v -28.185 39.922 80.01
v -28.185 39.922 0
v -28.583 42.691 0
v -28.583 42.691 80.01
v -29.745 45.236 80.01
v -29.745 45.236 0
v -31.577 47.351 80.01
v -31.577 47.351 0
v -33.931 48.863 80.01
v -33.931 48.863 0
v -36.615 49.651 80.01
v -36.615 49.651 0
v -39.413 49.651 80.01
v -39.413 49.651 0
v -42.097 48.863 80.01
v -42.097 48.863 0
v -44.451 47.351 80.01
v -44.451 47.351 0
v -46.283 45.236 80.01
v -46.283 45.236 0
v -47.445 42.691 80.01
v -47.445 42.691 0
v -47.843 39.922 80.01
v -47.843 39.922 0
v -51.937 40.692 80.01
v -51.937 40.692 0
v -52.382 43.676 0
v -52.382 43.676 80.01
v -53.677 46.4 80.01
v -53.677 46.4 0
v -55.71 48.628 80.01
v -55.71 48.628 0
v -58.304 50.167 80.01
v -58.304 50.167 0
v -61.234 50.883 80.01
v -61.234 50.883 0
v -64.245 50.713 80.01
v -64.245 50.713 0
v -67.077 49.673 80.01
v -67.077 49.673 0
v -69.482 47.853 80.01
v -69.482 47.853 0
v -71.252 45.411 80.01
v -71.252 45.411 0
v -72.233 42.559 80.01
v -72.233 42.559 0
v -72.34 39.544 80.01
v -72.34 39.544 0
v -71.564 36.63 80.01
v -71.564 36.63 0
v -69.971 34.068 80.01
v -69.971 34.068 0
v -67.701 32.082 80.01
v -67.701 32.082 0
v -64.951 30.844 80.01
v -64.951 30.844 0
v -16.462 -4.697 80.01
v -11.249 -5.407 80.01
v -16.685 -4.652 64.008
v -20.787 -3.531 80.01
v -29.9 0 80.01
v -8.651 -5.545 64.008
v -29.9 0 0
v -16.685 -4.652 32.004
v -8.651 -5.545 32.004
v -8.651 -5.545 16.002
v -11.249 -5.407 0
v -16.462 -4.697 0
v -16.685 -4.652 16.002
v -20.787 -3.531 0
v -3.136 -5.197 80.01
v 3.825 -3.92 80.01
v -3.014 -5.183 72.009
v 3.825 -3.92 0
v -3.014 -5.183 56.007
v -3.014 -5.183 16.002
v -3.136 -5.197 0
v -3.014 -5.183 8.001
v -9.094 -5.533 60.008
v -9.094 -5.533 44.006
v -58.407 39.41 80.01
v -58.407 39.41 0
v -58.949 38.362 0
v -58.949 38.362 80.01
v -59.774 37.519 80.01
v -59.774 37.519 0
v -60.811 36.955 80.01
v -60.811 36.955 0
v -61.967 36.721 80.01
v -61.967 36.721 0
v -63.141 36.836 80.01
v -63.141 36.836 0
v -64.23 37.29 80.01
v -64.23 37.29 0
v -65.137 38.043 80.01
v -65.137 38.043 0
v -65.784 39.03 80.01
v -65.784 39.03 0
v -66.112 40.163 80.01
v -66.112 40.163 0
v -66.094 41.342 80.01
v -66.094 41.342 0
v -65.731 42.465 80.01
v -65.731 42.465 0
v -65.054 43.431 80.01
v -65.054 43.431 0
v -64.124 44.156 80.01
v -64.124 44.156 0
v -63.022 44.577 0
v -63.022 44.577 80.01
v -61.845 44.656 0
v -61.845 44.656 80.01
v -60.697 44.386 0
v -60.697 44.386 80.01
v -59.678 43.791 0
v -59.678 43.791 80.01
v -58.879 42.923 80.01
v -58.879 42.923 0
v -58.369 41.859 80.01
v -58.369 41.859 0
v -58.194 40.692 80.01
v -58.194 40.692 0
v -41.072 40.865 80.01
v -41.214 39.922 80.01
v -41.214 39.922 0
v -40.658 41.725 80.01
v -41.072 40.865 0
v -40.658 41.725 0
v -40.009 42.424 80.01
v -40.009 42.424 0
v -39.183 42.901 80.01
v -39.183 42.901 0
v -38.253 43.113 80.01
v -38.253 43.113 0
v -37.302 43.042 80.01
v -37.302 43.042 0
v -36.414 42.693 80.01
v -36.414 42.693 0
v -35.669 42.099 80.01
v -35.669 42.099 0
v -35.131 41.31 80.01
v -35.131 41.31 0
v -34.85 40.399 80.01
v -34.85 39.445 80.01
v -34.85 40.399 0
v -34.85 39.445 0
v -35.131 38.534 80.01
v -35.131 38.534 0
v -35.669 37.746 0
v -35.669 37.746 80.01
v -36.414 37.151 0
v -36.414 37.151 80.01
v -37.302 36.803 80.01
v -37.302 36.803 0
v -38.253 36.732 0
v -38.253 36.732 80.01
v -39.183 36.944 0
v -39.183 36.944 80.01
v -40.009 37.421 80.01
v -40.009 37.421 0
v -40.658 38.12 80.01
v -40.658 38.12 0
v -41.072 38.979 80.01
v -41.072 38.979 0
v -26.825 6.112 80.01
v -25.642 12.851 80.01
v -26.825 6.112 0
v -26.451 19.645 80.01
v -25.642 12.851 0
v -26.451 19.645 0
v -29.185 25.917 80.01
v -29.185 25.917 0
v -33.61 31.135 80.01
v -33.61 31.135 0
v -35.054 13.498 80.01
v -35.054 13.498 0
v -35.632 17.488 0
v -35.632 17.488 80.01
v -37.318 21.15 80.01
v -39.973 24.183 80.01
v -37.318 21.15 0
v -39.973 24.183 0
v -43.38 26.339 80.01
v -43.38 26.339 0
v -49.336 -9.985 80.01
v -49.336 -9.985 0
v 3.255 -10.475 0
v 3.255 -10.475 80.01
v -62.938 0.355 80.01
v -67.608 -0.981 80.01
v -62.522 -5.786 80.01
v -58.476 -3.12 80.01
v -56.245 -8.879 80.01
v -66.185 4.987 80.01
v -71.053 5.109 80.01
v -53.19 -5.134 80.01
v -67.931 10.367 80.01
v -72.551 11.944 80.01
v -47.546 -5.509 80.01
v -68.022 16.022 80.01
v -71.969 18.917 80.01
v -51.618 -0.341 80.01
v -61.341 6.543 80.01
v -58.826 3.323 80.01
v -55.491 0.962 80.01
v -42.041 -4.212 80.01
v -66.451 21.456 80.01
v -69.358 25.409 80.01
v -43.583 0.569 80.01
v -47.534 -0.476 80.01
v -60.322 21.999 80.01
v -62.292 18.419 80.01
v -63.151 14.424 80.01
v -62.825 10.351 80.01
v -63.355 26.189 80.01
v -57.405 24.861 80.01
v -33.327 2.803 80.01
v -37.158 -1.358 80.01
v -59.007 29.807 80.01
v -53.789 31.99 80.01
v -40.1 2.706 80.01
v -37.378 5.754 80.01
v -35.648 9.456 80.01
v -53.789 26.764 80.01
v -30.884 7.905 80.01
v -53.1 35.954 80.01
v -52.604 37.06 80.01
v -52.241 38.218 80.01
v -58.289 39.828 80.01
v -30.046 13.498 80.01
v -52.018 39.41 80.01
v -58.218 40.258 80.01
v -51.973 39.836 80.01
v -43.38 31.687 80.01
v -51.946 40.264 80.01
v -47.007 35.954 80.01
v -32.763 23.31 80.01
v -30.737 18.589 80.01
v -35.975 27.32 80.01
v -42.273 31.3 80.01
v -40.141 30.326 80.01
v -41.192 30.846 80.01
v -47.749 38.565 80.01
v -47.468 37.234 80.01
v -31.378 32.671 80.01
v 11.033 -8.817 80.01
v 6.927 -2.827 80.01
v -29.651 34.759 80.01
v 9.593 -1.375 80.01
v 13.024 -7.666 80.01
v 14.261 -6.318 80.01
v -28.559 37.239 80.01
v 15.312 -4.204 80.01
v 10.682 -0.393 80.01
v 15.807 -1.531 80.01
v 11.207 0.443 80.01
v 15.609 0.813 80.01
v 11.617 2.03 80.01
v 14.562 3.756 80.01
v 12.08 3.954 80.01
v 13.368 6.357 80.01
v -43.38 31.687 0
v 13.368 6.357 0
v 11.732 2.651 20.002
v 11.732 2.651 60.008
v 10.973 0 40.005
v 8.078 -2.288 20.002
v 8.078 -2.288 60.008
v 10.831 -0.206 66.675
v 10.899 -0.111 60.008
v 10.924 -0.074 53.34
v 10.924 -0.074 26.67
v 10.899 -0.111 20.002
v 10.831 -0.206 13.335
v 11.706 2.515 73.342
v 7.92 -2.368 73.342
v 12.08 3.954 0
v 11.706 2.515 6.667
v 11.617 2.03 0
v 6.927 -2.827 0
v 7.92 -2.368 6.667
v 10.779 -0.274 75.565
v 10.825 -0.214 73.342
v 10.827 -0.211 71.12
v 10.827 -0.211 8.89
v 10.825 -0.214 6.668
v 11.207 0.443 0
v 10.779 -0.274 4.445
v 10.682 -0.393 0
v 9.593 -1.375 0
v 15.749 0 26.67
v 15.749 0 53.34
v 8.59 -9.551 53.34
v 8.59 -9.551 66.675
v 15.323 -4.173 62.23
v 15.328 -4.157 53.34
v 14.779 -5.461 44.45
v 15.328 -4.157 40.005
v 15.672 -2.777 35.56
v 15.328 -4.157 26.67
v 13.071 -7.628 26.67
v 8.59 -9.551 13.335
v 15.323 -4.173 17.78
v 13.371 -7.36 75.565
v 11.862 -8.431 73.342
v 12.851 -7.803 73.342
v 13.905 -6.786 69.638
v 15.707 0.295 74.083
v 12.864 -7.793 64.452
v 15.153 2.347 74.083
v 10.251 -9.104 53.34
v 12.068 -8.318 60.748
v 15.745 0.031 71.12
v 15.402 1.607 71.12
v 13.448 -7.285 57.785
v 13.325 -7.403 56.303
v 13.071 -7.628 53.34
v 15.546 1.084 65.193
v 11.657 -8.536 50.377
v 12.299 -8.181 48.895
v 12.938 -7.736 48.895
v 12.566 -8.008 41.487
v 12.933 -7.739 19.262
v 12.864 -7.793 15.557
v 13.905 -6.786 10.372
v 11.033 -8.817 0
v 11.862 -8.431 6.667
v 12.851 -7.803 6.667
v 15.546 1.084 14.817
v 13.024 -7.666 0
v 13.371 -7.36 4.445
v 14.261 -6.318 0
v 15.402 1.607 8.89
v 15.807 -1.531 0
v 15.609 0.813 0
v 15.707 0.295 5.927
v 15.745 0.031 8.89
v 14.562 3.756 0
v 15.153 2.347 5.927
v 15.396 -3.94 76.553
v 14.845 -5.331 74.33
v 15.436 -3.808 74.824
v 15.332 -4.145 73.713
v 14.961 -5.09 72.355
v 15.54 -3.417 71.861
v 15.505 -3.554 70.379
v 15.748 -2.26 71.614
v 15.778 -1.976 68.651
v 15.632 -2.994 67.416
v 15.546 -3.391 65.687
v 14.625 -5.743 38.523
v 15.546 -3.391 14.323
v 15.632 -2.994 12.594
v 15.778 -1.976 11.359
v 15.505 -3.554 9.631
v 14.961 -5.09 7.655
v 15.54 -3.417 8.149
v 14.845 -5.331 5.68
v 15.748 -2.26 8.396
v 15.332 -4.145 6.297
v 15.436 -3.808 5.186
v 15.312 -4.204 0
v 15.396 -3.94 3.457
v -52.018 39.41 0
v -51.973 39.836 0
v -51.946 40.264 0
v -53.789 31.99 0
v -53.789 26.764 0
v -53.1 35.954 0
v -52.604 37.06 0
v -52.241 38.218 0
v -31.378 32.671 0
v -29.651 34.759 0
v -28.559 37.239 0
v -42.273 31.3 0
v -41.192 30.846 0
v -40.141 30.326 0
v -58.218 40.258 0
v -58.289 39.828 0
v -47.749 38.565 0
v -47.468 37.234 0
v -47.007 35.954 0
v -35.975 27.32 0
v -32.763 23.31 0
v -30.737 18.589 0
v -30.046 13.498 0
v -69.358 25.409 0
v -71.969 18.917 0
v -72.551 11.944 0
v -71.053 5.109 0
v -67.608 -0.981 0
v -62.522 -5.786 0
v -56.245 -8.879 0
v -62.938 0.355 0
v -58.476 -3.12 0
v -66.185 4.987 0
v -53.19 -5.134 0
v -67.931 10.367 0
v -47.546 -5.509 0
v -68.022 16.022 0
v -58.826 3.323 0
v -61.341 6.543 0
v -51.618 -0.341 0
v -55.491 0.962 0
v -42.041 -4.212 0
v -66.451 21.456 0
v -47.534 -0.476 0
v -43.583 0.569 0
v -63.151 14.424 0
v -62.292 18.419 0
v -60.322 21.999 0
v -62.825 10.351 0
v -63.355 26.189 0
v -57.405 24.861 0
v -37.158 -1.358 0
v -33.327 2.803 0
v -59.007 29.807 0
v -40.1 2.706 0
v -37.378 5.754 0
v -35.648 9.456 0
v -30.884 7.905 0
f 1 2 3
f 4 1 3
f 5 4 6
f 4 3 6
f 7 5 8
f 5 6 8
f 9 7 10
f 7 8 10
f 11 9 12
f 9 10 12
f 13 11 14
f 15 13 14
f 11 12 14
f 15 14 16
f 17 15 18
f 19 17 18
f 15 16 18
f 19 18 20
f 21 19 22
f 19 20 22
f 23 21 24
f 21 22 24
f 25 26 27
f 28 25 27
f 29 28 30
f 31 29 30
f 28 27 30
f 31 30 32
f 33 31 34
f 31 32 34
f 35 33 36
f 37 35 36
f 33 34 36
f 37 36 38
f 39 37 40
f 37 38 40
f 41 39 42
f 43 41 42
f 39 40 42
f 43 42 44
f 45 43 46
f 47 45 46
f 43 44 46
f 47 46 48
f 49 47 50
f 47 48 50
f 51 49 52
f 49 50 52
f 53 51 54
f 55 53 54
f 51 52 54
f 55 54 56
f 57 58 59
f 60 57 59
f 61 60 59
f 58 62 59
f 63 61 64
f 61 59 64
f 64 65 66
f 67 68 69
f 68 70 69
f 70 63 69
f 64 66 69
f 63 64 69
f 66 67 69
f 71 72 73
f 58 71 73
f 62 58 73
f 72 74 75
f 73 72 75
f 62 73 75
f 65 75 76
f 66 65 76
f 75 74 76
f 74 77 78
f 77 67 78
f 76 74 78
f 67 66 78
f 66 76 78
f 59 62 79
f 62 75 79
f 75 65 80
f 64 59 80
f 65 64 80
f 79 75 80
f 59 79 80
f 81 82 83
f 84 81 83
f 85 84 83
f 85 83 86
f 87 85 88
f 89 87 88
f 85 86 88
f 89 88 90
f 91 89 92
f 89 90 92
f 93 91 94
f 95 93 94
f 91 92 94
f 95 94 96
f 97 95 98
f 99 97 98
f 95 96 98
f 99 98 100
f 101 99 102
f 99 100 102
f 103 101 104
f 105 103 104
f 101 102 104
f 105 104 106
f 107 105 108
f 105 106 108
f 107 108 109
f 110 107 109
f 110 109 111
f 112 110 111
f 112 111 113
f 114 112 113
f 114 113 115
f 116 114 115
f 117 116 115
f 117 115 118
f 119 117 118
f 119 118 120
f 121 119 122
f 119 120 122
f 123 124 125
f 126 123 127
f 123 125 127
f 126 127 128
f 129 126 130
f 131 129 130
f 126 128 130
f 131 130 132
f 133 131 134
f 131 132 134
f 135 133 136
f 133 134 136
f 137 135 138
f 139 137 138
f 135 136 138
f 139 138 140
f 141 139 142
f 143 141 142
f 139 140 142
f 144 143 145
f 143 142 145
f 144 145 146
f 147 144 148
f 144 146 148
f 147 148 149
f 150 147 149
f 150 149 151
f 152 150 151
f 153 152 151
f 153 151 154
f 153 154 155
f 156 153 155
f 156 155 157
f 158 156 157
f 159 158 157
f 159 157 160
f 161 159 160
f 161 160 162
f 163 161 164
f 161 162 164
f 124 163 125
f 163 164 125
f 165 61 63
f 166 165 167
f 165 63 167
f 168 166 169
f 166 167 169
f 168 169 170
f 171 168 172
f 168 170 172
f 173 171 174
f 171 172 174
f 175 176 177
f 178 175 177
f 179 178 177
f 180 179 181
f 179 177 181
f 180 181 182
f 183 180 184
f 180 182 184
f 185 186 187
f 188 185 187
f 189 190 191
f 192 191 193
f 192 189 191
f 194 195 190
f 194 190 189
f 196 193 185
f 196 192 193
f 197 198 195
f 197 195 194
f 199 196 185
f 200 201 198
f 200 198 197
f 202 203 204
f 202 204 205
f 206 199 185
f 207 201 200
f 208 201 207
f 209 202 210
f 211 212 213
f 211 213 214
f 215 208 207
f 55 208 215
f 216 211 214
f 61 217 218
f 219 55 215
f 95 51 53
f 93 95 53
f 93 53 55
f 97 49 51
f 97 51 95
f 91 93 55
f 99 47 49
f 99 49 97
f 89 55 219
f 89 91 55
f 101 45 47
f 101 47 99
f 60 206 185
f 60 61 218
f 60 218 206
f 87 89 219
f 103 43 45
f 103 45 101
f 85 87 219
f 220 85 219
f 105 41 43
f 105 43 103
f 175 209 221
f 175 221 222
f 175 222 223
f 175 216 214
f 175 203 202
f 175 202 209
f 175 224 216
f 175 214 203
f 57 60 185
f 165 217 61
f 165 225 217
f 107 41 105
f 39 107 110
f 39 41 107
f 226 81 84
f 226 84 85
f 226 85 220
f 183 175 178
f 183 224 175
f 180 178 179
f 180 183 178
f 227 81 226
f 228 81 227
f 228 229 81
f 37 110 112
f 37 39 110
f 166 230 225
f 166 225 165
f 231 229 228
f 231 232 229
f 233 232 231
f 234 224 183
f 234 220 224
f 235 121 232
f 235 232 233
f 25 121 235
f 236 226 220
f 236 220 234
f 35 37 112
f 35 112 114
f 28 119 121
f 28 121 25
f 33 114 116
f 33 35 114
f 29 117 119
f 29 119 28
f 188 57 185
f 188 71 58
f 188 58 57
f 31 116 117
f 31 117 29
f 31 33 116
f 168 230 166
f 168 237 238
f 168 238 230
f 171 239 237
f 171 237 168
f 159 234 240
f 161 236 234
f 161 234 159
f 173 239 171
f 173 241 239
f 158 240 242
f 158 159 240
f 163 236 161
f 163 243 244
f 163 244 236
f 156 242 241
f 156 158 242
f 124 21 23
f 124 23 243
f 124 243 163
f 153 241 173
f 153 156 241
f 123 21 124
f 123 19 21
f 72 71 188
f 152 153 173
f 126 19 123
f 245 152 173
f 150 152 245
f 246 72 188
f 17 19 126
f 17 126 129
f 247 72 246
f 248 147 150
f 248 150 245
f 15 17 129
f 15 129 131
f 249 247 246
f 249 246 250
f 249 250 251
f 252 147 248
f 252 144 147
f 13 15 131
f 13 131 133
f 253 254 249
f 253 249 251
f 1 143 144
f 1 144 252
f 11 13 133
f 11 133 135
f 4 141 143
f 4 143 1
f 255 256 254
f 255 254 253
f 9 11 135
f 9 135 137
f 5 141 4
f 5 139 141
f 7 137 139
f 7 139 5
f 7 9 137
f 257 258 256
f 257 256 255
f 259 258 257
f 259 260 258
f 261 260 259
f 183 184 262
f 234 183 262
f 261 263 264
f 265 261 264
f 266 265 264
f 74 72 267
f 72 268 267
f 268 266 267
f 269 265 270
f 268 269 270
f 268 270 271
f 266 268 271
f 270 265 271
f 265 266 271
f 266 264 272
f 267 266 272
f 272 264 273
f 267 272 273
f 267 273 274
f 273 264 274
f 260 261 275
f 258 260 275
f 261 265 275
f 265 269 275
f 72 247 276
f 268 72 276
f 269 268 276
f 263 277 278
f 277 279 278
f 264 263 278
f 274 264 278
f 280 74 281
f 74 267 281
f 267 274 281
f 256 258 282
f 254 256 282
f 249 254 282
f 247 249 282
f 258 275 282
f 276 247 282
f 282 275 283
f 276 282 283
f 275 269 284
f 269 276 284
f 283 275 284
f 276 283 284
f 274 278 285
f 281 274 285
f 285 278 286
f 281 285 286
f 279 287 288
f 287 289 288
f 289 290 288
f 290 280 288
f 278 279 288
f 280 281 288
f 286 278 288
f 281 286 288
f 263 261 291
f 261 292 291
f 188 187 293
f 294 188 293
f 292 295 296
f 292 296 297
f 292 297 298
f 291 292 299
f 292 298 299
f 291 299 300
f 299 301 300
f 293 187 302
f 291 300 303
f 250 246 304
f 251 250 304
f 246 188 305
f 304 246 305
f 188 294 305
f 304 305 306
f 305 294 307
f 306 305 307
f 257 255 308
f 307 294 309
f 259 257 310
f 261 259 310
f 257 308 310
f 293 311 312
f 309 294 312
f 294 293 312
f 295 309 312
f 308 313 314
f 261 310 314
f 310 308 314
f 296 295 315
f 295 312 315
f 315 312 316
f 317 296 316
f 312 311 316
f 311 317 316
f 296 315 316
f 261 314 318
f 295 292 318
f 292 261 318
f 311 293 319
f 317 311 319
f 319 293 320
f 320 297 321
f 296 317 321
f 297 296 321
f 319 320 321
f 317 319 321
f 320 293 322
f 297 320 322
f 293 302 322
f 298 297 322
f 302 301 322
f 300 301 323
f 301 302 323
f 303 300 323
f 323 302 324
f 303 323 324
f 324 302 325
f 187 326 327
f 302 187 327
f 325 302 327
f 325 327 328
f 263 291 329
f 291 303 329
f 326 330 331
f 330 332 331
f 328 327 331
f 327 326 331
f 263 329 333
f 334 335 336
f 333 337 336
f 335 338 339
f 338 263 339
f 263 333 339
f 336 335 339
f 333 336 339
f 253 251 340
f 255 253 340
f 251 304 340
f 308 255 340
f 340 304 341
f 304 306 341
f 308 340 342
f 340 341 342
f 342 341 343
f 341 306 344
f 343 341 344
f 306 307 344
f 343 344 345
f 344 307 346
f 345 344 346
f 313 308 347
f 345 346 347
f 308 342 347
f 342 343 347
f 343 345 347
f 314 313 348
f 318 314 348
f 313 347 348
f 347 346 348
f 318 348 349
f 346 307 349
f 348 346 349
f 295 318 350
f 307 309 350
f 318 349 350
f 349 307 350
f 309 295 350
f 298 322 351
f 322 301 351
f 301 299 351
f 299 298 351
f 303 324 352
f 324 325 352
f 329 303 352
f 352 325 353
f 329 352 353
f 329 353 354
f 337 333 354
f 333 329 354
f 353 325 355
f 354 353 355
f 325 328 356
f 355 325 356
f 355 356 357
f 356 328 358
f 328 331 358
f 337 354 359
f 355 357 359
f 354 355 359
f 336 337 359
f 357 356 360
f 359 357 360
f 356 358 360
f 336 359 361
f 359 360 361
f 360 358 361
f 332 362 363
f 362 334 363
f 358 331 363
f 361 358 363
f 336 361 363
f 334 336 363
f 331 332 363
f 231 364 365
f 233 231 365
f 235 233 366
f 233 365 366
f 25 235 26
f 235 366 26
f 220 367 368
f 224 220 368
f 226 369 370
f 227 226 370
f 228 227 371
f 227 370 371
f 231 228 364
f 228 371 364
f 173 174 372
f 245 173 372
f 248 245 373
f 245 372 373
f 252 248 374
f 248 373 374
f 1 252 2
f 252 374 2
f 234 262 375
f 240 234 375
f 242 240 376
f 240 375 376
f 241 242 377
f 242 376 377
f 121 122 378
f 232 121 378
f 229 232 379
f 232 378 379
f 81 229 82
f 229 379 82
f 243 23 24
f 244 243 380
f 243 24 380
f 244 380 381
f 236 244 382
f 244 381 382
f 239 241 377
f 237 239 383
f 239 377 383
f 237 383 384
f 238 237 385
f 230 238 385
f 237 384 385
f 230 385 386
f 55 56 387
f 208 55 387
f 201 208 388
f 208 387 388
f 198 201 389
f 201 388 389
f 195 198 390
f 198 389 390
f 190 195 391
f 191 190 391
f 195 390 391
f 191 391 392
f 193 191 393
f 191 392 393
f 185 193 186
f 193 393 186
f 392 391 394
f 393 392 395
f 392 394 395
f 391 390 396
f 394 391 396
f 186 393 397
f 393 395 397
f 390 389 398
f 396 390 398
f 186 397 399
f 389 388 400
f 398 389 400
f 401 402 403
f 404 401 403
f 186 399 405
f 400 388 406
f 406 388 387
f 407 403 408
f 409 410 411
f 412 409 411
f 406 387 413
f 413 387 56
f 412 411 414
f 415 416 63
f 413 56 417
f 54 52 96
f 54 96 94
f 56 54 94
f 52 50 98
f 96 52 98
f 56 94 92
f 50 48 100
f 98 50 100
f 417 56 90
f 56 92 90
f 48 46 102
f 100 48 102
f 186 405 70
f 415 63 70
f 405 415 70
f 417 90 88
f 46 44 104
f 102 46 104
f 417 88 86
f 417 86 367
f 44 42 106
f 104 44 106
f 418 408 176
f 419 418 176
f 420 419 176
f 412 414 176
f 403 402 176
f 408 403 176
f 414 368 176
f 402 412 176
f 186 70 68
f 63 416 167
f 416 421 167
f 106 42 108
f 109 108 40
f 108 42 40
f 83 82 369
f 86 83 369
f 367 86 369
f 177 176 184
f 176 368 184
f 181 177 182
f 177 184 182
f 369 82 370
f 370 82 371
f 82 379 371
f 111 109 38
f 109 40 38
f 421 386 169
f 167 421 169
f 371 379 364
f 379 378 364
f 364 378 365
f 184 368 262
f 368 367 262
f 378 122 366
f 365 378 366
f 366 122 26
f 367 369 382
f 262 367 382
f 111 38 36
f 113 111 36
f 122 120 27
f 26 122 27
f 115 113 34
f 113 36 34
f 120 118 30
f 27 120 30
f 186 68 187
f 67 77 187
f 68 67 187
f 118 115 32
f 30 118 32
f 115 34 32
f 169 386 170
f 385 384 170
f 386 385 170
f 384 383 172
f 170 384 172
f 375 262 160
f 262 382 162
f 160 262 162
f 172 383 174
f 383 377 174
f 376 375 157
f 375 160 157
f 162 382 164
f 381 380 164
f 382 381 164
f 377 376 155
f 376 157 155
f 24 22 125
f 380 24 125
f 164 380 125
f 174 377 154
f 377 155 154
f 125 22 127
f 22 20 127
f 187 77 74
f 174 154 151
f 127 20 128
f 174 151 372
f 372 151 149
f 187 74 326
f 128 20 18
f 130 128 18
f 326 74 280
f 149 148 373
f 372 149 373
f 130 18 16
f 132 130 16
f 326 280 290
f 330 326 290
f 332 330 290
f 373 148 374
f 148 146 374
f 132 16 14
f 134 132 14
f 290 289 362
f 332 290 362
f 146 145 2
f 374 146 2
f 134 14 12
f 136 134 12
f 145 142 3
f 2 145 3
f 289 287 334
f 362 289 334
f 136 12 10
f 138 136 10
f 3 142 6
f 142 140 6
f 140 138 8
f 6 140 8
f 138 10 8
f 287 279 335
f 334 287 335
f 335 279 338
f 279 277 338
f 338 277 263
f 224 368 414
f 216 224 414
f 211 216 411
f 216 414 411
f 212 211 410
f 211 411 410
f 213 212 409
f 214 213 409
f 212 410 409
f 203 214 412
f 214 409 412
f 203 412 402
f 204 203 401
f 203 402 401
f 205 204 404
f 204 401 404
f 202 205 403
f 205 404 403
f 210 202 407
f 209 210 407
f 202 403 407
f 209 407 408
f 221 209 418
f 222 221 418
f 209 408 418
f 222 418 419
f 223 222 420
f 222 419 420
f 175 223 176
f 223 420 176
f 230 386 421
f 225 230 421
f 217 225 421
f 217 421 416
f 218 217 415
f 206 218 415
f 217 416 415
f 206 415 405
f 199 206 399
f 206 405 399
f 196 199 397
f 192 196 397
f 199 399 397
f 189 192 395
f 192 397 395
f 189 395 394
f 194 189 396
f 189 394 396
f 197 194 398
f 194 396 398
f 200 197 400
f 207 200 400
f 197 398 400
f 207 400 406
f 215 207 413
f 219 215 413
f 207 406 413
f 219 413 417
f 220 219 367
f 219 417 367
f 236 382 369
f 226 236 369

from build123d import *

# Parameters (mm, degrees)
F1_DEPTH = 80.01


with BuildPart() as f1:
    # F0 (on Top) → F1 (new body)
    with BuildSketch(Plane.XY):
        with BuildLine():
            ThreePointArc((-52.0181724305, 39.4095291981), (-51.9576561565, 40.0496439589), (-51.9374574868, 40.6922956066))
            ThreePointArc((-51.9374574868, 40.6922956066), (-68.346740432, 48.8523585987), (-64.9508257487, 30.8435008261))
            ThreePointArc((-64.9508257487, 30.8435008261), (-58.1184104532, 31.2953658368), (-53.1003625737, 35.9542580053))
            ThreePointArc((-53.1003625737, 35.9542580053), (-52.4052375143, 37.6336514449), (-52.0181724305, 39.4095291981))
        make_face()
        with BuildLine():
            ThreePointArc((-58.1941987012, 40.6922956066), (-58.2476999322, 40.0421660606), (-58.4067640965, 39.4095291981))
            ThreePointArc((-58.4067640965, 39.4095291981), (-66.0943613472, 41.3424251525), (-58.1941987012, 40.6922956066))
        make_face(mode=Mode.SUBTRACT)
        with BuildLine():
            ThreePointArc((-53.1003625737, 35.9542580053), (-58.1184104532, 31.2953658368), (-64.9508257487, 30.8435008261))
            ThreePointArc((-64.9508257487, 30.8435008261), (-71.0530970633, 5.1094793368), (-49.3361916364, -9.9853408308))
            ThreePointArc((-49.3361916364, -9.9853408308), (-38.3858948602, -7.3909049304), (-29.8997519532, 0))
            ThreePointArc((-29.8997519532, 0), (-25.7978316087, 16.2774443926), (-33.6100307457, 31.1351188778))
            ThreePointArc((-33.6100307457, 31.1351188778), (-36.8058711165, 30.1677726155), (-40.1411486067, 30.3261346384))
            ThreePointArc((-40.1411486067, 30.3261346384), (-32.7630206932, 23.3103643966), (-30.0455065973, 13.4984878823))
            ThreePointArc((-30.0455065973, 13.4984878823), (-60.8364931775, -1.5486798035), (-53.788710164, 31.9898184416))
            ThreePointArc((-53.788710164, 31.9898184416), (-48.5632811871, 32.5626024415), (-43.3799688199, 31.6871240532))
            ThreePointArc((-43.3799688199, 31.6871240532), (-45.5036090688, 33.5569434788), (-47.0065913216, 35.9542580053))
            Line((-47.0065913216, 35.9542580053), (-53.1003625737, 35.9542580053))
        make_face()
        with BuildLine():
            ThreePointArc((-29.8997519532, 0), (-38.3858948602, -7.3909049304), (-49.3361916364, -9.9853408308))
            Line((-49.3361916364, -9.9853408308), (3.2553945492, -10.4746920389))
            add(Edge.make_bspline(
                [(3.2553945492, -10.4746920389), (6.7725717344, -9.8207747634), (14.1786098266, -9.4323508669), (16.9026280052, 0.2286933526), (14.1061528831, 4.5015575397), (13.3681874722, 6.3572456129)],
                knots=[0, 0, 0, 0, 0.2950154938, 0.5574011727, 0.7978396153, 0.7978396153, 0.7978396153, 0.7978396153], degree=3))
            add(Edge.make_bspline(
                [(13.3681874722, 6.3572456129), (11.2107009371, 3.3907004664), (12.783682015, -0.4484184196), (6.7198718752, -3.0864083593), (3.824606613, -3.9195654149)],
                knots=[0, 0, 0, 0, 0.1402226837, 0.2938290091, 0.2938290091, 0.2938290091, 0.2938290091], degree=3))
            add(Edge.make_bspline(
                [(3.824606613, -3.9195654149), (1.041154088, -4.7205466376), (-3.5627301285, -5.2600412779), (-8.5742747125, -5.7629574016), (-16.8940584015, -4.8756628828), (-22.6225553896, -2.945389447), (-27.3635536713, -1.014278557), (-29.8997519532, 0)],
                knots=[0.2938290091, 0.2938290091, 0.2938290091, 0.2938290091, 0.441503186, 0.5626049111, 0.7155603519, 0.8496584077, 1, 1, 1, 1], degree=3))
        make_face()
        with BuildLine():
            ThreePointArc((-47.8431273342, 39.9222357019), (-47.6317197983, 37.8946361667), (-47.0065913216, 35.9542580053))
            ThreePointArc((-47.0065913216, 35.9542580053), (-45.5036090688, 33.5569434788), (-43.3799688199, 31.6871240532))
            ThreePointArc((-43.3799688199, 31.6871240532), (-41.7291546645, 31.0813632615), (-40.1411486067, 30.3261346384))
            ThreePointArc((-40.1411486067, 30.3261346384), (-36.8058711165, 30.1677726155), (-33.6100307457, 31.1351188778))
            ThreePointArc((-33.6100307457, 31.1351188778), (-29.6505897586, 34.7588262655), (-28.1851099211, 39.9222357019))
            ThreePointArc((-28.1851099211, 39.9222357019), (-38.0141186277, 49.7512444085), (-47.8431273342, 39.9222357019))
        make_face()
        with BuildLine():
            ThreePointArc((-34.8145098579, 39.9222357019), (-38.0141186277, 36.7226269322), (-41.2137273974, 39.9222357019))
            ThreePointArc((-41.2137273974, 39.9222357019), (-38.0141186277, 43.1218444717), (-34.8145098579, 39.9222357019))
        make_face(mode=Mode.SUBTRACT)
        with BuildLine():
            ThreePointArc((-35.0538748718, 13.4984878823), (-37.3175811218, 21.1501729283), (-43.3799688199, 26.3386317966))
            ThreePointArc((-43.3799688199, 26.3386317966), (-48.5435084418, 27.5505681179), (-53.788710164, 26.7639360781))
            ThreePointArc((-53.788710164, 26.7639360781), (-57.2447397838, 2.0206160275), (-35.0538748718, 13.4984878823))
        make_face()
        with BuildLine():
            Line((-43.3799688199, 26.3386317966), (-43.3799688199, 31.6871240532))
            ThreePointArc((-43.3799688199, 31.6871240532), (-48.5632811871, 32.5626024415), (-53.788710164, 31.9898184416))
            Line((-53.788710164, 31.9898184416), (-53.788710164, 26.7639360781))
            ThreePointArc((-53.788710164, 26.7639360781), (-48.5435084418, 27.5505681179), (-43.3799688199, 26.3386317966))
        make_face()
    extrude(amount=F1_DEPTH)


solid = f1.part
